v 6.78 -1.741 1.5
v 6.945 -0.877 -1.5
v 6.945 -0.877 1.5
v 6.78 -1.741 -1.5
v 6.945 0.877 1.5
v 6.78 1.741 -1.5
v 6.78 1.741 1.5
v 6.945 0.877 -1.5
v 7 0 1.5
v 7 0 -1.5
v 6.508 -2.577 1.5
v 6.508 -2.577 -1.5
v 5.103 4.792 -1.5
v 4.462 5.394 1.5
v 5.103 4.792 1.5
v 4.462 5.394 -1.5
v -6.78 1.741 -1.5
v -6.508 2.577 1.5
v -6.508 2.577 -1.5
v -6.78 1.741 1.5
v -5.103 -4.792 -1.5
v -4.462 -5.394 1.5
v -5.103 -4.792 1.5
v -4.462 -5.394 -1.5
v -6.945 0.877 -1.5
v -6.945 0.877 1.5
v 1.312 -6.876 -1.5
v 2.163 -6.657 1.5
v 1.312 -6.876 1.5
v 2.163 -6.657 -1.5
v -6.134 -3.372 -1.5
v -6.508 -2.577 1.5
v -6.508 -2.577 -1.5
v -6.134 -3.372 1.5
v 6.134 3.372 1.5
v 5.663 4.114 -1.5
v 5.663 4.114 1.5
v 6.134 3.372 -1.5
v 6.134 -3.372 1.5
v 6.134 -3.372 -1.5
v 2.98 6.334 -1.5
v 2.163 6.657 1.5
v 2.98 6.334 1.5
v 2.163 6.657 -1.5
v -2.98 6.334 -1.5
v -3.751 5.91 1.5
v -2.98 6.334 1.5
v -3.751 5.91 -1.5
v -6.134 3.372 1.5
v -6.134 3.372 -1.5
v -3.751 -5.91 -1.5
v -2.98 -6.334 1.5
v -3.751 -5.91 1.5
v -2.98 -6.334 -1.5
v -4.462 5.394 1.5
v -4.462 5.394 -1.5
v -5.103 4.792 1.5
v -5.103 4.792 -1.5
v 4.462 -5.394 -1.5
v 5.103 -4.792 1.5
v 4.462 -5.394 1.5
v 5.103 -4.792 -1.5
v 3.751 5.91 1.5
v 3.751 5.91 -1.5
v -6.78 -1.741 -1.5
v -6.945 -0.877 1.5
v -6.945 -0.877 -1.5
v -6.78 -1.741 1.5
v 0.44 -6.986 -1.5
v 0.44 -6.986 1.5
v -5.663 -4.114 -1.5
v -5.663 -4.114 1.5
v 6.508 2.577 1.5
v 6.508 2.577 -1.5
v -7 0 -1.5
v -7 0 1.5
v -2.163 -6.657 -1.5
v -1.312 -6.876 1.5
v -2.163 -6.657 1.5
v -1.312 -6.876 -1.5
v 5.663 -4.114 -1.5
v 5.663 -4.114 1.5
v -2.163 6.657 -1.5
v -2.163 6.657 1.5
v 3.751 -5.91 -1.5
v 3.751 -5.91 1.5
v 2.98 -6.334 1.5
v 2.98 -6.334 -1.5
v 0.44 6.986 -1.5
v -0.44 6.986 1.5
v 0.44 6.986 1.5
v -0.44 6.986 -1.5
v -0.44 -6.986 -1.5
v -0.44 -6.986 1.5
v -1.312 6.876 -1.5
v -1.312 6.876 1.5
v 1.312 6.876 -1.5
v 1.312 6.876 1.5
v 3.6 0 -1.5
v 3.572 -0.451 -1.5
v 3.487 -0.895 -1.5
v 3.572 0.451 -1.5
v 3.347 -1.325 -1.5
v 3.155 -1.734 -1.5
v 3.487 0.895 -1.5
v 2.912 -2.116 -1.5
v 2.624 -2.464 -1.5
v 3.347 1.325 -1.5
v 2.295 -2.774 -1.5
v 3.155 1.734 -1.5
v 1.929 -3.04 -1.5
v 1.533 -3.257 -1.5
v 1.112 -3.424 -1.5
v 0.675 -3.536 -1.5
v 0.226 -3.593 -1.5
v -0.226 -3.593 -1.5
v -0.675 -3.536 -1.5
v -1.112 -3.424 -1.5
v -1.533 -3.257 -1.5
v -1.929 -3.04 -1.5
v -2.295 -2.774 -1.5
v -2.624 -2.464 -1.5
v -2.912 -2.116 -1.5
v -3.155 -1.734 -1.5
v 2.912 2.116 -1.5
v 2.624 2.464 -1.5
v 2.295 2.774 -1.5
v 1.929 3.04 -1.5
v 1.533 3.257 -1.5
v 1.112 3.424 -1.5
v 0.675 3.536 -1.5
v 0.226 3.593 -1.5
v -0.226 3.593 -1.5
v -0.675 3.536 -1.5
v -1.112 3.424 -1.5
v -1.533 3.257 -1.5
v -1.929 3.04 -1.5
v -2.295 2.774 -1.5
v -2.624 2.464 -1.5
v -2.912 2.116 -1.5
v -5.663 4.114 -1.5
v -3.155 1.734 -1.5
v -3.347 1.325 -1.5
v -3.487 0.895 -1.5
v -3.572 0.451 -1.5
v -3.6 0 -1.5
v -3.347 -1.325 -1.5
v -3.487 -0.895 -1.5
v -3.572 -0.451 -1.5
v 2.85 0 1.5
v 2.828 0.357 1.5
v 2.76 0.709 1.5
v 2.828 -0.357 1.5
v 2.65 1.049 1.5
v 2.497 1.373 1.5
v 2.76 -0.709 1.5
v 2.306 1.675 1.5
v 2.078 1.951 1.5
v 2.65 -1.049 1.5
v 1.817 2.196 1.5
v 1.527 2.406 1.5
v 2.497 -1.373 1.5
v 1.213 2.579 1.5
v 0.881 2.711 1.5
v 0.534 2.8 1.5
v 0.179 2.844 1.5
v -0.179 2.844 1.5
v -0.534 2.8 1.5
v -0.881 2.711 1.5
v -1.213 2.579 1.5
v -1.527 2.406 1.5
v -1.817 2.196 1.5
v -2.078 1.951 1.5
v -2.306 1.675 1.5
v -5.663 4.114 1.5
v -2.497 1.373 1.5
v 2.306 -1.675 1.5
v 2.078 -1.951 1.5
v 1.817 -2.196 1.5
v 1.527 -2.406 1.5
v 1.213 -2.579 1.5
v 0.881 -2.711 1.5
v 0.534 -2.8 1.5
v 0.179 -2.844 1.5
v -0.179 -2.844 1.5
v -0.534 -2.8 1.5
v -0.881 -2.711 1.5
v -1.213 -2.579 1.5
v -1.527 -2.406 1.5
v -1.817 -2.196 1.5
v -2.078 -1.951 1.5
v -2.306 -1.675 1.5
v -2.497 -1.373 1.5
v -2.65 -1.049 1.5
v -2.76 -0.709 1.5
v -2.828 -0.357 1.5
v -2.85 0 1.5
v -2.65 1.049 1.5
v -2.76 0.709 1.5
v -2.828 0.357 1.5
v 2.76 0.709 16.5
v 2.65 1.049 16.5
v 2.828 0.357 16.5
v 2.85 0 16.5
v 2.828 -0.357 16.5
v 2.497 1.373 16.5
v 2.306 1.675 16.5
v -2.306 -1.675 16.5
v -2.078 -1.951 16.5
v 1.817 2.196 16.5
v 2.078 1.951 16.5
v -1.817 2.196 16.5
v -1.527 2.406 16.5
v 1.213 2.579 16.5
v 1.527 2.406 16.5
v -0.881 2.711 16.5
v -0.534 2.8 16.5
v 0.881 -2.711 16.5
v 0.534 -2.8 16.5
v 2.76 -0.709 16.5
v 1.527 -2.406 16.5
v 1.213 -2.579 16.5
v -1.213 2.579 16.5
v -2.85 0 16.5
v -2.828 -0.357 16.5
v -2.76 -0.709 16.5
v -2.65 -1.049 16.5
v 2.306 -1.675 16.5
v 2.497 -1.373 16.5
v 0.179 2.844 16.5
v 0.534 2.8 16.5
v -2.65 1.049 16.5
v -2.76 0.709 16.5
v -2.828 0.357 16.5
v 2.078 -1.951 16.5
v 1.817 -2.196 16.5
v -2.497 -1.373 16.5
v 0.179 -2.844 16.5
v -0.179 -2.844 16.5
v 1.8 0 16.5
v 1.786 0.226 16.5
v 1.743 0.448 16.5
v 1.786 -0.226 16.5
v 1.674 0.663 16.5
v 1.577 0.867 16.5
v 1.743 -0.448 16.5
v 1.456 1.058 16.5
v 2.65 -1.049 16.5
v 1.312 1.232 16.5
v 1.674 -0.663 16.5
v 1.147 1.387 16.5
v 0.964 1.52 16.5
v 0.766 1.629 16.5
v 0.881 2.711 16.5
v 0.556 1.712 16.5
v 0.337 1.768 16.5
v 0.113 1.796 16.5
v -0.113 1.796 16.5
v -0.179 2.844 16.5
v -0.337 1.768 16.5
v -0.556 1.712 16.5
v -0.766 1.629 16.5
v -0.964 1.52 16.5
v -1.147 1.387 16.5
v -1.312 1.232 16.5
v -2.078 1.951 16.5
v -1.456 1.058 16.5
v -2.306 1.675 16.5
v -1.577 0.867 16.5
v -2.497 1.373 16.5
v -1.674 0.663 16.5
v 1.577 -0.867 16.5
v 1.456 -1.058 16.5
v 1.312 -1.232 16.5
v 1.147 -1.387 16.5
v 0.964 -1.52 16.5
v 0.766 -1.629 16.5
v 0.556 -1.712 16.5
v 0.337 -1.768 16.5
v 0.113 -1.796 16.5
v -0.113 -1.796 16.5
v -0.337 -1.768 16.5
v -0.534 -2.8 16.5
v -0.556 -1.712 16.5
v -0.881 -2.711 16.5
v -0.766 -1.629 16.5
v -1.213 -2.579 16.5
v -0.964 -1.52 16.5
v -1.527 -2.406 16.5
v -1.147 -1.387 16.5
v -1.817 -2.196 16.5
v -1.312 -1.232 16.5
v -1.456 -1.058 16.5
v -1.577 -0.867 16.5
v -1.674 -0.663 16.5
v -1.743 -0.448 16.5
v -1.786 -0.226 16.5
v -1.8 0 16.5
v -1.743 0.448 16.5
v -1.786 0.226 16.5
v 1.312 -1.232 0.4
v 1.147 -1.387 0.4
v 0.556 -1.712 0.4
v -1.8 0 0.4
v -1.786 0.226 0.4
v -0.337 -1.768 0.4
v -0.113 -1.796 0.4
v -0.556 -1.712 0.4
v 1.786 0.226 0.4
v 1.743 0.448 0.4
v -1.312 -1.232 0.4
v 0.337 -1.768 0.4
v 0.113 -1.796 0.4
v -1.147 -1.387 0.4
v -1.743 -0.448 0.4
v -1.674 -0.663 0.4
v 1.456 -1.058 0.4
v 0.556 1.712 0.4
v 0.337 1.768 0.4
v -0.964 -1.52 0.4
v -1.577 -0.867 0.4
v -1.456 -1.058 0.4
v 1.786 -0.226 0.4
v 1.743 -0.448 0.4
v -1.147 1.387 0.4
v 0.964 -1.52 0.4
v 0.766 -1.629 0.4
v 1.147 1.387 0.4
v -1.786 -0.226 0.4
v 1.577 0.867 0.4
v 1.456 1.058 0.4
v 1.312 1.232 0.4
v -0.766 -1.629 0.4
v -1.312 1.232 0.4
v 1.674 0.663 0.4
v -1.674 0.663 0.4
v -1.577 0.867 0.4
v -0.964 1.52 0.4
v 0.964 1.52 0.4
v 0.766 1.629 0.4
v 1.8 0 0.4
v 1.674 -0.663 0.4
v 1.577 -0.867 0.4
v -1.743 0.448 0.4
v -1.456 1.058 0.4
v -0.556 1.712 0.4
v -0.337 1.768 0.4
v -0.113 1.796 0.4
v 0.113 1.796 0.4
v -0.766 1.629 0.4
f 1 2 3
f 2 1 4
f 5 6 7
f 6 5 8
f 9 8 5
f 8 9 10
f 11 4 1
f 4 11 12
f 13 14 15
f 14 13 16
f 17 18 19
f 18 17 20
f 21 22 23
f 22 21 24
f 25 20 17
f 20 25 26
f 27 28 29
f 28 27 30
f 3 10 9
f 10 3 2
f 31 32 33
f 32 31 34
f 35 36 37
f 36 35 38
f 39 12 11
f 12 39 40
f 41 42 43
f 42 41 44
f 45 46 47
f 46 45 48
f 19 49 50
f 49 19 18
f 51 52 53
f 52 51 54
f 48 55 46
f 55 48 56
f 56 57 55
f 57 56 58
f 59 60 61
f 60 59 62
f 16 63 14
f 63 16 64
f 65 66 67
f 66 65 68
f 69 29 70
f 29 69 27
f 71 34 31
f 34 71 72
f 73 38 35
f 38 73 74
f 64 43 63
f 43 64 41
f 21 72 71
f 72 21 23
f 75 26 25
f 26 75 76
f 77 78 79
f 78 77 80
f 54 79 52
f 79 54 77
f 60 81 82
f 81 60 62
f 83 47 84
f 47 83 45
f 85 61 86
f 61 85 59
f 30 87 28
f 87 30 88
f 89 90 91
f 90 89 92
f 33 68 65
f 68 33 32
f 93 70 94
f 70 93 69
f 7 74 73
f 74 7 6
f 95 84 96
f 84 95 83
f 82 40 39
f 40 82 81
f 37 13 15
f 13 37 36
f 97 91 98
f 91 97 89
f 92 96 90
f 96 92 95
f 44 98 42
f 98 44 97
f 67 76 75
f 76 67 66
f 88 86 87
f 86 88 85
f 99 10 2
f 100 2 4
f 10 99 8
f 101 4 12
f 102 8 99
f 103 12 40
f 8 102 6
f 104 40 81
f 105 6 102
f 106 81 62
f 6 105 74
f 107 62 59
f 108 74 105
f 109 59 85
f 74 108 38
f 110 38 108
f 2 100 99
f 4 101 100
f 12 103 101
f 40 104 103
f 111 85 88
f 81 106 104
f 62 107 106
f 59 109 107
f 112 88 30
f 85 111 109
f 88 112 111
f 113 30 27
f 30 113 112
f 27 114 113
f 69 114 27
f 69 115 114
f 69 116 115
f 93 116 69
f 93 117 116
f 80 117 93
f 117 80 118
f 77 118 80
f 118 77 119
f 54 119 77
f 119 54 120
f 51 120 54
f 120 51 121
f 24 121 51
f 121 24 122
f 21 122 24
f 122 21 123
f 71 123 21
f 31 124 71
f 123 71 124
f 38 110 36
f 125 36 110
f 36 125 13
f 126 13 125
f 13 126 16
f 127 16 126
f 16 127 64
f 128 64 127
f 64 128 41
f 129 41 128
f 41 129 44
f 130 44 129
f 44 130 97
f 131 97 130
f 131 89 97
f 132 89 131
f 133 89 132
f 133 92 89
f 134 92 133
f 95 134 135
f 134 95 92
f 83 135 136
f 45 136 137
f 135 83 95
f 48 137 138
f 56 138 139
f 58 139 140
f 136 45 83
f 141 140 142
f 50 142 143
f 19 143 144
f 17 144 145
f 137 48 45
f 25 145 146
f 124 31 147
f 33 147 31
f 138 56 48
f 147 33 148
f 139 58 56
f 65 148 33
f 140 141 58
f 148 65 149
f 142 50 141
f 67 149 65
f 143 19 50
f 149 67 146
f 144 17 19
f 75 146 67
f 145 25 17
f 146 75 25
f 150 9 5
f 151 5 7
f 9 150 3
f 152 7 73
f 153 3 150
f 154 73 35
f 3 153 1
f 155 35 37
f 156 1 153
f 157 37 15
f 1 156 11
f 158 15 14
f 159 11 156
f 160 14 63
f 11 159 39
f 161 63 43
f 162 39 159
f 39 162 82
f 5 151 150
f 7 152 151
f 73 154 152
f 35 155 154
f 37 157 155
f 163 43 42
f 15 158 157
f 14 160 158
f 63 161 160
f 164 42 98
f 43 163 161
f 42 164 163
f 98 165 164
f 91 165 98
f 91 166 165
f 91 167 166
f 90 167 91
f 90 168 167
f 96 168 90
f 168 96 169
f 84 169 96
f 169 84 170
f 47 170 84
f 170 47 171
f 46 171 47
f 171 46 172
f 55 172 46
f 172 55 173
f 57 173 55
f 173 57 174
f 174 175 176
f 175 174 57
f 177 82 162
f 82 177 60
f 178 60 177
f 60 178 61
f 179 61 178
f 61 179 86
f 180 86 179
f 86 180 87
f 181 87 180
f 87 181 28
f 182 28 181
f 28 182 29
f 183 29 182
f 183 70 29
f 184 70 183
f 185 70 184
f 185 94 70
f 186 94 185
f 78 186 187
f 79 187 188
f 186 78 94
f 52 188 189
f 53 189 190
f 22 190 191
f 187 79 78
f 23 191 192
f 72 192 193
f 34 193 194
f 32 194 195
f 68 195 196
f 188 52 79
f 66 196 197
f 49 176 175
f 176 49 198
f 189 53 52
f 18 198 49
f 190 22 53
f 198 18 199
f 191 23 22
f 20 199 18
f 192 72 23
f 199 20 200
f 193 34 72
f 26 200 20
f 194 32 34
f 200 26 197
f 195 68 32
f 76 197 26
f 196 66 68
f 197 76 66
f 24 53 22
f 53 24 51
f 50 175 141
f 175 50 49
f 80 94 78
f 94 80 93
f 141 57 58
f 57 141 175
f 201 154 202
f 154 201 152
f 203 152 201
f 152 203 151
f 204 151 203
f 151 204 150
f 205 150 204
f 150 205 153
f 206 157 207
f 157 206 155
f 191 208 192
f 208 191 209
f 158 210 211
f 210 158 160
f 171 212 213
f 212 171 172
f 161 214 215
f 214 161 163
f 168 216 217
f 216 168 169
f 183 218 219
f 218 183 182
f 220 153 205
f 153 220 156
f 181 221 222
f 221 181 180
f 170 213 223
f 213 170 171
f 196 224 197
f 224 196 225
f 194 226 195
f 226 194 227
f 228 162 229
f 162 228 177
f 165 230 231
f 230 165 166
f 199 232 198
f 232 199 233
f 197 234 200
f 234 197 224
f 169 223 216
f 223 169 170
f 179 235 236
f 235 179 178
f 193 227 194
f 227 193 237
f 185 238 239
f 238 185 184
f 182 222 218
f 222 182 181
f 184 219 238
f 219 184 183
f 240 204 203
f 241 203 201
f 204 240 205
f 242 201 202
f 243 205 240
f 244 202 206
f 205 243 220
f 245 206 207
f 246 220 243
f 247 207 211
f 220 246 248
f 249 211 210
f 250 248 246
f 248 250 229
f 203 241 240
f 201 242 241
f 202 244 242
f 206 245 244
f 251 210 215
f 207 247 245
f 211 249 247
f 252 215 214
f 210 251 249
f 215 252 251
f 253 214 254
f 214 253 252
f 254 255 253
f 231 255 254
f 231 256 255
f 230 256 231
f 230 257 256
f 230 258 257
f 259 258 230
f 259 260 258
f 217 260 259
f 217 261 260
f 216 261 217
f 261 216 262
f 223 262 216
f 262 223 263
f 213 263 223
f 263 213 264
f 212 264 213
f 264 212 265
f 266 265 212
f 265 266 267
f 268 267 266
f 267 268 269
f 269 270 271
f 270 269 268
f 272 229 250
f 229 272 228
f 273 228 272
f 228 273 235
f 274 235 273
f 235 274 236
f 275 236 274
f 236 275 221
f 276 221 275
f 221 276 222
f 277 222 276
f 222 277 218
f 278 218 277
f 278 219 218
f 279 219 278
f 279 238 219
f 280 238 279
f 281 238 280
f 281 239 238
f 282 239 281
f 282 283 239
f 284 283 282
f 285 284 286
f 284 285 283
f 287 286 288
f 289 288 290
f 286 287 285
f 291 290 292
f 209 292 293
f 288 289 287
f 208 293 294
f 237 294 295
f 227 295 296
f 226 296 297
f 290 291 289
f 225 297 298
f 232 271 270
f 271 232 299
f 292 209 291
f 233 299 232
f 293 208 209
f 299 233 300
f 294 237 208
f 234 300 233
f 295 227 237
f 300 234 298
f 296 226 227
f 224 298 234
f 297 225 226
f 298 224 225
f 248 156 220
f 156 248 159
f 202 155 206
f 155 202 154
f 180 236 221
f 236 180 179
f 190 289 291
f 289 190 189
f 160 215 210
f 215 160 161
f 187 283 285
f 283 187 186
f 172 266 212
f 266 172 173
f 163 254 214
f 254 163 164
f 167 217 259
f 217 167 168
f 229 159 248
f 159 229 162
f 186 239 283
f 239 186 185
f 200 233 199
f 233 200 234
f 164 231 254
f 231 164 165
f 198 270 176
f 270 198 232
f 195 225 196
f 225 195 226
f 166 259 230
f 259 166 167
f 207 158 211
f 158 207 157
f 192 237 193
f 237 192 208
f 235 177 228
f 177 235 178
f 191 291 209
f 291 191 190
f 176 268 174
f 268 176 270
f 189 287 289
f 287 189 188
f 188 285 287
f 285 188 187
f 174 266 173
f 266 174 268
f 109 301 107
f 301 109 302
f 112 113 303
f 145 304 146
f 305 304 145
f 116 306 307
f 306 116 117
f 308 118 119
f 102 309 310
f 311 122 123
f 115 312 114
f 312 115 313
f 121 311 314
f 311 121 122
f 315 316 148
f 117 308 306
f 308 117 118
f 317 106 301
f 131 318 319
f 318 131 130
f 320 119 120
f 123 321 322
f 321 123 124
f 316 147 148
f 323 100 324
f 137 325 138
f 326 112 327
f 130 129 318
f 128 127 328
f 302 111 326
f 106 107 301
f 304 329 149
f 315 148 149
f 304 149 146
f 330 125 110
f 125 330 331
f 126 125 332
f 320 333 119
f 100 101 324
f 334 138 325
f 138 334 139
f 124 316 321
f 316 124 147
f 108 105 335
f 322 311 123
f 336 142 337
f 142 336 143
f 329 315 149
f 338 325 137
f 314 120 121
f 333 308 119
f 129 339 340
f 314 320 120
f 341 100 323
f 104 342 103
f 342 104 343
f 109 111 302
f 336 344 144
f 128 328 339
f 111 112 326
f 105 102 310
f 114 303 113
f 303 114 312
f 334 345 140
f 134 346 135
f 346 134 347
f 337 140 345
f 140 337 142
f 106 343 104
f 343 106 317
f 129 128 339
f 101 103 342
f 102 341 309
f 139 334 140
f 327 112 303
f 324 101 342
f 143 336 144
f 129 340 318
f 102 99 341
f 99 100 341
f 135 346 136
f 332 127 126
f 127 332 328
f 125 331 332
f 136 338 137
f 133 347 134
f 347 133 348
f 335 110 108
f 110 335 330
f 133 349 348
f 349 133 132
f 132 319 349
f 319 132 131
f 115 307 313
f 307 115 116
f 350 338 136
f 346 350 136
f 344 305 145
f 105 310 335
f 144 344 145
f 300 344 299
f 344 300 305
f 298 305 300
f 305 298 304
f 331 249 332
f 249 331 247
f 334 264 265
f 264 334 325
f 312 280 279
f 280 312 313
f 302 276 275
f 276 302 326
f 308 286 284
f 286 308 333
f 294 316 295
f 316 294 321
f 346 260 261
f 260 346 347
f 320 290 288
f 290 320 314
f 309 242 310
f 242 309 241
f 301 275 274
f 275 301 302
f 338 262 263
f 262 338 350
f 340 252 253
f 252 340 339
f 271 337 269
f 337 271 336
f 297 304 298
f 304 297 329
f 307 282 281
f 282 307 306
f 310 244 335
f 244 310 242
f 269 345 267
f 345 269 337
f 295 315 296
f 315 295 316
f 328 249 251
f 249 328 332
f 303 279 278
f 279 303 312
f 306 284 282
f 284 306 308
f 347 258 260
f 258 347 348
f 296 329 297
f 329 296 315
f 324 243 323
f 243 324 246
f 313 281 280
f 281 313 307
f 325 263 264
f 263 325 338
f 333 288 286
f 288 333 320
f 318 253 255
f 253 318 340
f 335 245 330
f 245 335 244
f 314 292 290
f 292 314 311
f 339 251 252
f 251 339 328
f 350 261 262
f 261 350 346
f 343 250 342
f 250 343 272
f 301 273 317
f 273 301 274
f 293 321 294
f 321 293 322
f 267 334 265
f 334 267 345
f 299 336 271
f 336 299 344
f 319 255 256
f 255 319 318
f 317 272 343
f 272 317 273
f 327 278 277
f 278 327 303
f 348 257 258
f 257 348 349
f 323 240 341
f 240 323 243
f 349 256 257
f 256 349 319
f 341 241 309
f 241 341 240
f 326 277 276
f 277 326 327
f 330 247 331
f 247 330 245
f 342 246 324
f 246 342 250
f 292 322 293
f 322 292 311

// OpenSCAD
$fn = 50;


difference() {
	union() {
		translate(v = [0, 0, -1.5000000000]) {
			cylinder(h = 3, r = 7.0000000000);
		}
		translate(v = [0, 0, -1.5000000000]) {
			cylinder(h = 18, r = 2.8500000000);
		}
	}
	union() {
		translate(v = [0, 0, -1.5000000000]) {
			rotate(a = [0, 180, 0]) {
				difference() {
					union() {
						translate(v = [0, 0, -18.0000000000]) {
							cylinder(h = 18, r = 1.5000000000);
						}
						translate(v = [0, 0, -1.9000000000]) {
							cylinder(h = 1.9000000000, r1 = 1.8000000000, r2 = 3.6000000000);
						}
						translate(v = [0, 0, -18.0000000000]) {
							cylinder(h = 18, r = 1.8000000000);
						}
						translate(v = [0, 0, -18.0000000000]) {
							cylinder(h = 18, r = 1.5000000000);
						}
					}
					union();
				}
			}
		}
		translate(v = [0, 0, -50.0000000000]) {
			cylinder(h = 100, r = 1.8000000000);
		}
	}
}
